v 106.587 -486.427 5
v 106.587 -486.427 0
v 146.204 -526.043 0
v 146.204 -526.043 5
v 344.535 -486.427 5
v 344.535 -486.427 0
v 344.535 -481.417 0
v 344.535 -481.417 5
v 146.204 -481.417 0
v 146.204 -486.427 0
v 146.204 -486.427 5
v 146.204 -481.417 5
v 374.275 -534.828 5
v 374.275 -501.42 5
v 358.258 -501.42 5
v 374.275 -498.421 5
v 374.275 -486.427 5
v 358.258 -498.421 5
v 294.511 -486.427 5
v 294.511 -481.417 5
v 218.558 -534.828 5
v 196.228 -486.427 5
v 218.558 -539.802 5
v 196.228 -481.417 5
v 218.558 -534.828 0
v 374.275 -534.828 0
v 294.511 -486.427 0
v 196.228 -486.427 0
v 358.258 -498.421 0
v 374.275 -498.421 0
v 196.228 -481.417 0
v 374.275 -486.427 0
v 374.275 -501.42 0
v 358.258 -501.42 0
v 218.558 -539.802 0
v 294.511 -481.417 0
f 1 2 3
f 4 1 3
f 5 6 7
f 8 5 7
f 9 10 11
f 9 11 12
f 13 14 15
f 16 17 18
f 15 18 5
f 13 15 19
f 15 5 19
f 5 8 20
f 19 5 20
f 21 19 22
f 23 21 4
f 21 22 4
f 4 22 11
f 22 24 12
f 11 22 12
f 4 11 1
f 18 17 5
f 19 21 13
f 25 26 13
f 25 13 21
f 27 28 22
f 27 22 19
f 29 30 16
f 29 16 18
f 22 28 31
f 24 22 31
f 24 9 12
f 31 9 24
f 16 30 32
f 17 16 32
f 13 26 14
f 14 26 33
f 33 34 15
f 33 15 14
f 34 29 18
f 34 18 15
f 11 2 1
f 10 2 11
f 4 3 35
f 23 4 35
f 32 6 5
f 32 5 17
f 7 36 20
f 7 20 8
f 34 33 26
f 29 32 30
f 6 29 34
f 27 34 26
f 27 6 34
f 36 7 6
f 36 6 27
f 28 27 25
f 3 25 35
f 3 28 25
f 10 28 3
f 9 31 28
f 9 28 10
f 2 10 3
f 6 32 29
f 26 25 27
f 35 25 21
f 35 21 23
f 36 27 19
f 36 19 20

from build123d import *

# Parameters (mm, degrees)
PAD007_DEPTH = 5


with BuildPart() as part:
    # Sketch008 → Pad007 (new body)
    with BuildSketch(Plane.XY):
        with BuildLine():
            add(Edge.make_bspline(
                [(106.586773, -486.426543), (146.203717, -486.426543)],
                knots=[0, 0, 112.3, 112.3], degree=1))
            add(Edge.make_bspline(
                [(146.203717, -486.426543), (146.203717, -481.417098)],
                knots=[0, 0, 14.2, 14.2], degree=1))
            add(Edge.make_bspline(
                [(146.203717, -481.417098), (196.227605, -481.417098)],
                knots=[0, 0, 141.8, 141.8], degree=1))
            add(Edge.make_bspline(
                [(196.227605, -486.426543), (196.227605, -481.417098)],
                knots=[0, 0, 14.2, 14.2], degree=1))
            add(Edge.make_bspline(
                [(196.227605, -486.426543), (294.511491, -486.426543)],
                knots=[0, 0, 278.6, 278.6], degree=1))
            add(Edge.make_bspline(
                [(294.511491, -486.426543), (294.511491, -481.417098)],
                knots=[0, 0, 14.2, 14.2], degree=1))
            add(Edge.make_bspline(
                [(294.511491, -481.417098), (344.535379, -481.417098)],
                knots=[0, 0, 141.8, 141.8], degree=1))
            add(Edge.make_bspline(
                [(344.535379, -486.426543), (344.535379, -481.417098)],
                knots=[0, 0, 14.2, 14.2], degree=1))
            add(Edge.make_bspline(
                [(344.535379, -486.426543), (374.274545, -486.426543)],
                knots=[0, 0, 84.3, 84.3], degree=1))
            add(Edge.make_bspline(
                [(374.274545, -498.420987), (374.274545, -486.426543)],
                knots=[0, 0, 34, 34], degree=1))
            add(Edge.make_bspline(
                [(374.274545, -498.420987), (358.258434, -498.420987)],
                knots=[0, 0, 45.4, 45.4], degree=1))
            add(Edge.make_bspline(
                [(358.258434, -498.420987), (358.258434, -501.419598)],
                knots=[0, 0, 8.5, 8.5], degree=1))
            add(Edge.make_bspline(
                [(358.258434, -501.419598), (374.274545, -501.419598)],
                knots=[0, 0, 45.4, 45.4], degree=1))
            add(Edge.make_bspline(
                [(374.274545, -534.827653), (374.274545, -501.419598)],
                knots=[0, 0, 94.7, 94.7], degree=1))
            add(Edge.make_bspline(
                [(374.274545, -534.827653), (218.558437, -534.827653)],
                knots=[0, 0, 441.4, 441.4], degree=1))
            add(Edge.make_bspline(
                [(218.558437, -534.827653), (218.558437, -539.801819)],
                knots=[0, 0, 14.1, 14.1], degree=1))
            add(Edge.make_bspline(
                [(146.203717, -526.043486), (218.558437, -539.801819)],
                knots=[0, 0, 208.775022, 208.775022], degree=1))
            add(Edge.make_bspline(
                [(106.586773, -486.426543), (146.203717, -526.043486)],
                knots=[0, 0, 158.816183, 158.816183], degree=1))
        make_face()
    extrude(amount=PAD007_DEPTH)


solid = part.part
